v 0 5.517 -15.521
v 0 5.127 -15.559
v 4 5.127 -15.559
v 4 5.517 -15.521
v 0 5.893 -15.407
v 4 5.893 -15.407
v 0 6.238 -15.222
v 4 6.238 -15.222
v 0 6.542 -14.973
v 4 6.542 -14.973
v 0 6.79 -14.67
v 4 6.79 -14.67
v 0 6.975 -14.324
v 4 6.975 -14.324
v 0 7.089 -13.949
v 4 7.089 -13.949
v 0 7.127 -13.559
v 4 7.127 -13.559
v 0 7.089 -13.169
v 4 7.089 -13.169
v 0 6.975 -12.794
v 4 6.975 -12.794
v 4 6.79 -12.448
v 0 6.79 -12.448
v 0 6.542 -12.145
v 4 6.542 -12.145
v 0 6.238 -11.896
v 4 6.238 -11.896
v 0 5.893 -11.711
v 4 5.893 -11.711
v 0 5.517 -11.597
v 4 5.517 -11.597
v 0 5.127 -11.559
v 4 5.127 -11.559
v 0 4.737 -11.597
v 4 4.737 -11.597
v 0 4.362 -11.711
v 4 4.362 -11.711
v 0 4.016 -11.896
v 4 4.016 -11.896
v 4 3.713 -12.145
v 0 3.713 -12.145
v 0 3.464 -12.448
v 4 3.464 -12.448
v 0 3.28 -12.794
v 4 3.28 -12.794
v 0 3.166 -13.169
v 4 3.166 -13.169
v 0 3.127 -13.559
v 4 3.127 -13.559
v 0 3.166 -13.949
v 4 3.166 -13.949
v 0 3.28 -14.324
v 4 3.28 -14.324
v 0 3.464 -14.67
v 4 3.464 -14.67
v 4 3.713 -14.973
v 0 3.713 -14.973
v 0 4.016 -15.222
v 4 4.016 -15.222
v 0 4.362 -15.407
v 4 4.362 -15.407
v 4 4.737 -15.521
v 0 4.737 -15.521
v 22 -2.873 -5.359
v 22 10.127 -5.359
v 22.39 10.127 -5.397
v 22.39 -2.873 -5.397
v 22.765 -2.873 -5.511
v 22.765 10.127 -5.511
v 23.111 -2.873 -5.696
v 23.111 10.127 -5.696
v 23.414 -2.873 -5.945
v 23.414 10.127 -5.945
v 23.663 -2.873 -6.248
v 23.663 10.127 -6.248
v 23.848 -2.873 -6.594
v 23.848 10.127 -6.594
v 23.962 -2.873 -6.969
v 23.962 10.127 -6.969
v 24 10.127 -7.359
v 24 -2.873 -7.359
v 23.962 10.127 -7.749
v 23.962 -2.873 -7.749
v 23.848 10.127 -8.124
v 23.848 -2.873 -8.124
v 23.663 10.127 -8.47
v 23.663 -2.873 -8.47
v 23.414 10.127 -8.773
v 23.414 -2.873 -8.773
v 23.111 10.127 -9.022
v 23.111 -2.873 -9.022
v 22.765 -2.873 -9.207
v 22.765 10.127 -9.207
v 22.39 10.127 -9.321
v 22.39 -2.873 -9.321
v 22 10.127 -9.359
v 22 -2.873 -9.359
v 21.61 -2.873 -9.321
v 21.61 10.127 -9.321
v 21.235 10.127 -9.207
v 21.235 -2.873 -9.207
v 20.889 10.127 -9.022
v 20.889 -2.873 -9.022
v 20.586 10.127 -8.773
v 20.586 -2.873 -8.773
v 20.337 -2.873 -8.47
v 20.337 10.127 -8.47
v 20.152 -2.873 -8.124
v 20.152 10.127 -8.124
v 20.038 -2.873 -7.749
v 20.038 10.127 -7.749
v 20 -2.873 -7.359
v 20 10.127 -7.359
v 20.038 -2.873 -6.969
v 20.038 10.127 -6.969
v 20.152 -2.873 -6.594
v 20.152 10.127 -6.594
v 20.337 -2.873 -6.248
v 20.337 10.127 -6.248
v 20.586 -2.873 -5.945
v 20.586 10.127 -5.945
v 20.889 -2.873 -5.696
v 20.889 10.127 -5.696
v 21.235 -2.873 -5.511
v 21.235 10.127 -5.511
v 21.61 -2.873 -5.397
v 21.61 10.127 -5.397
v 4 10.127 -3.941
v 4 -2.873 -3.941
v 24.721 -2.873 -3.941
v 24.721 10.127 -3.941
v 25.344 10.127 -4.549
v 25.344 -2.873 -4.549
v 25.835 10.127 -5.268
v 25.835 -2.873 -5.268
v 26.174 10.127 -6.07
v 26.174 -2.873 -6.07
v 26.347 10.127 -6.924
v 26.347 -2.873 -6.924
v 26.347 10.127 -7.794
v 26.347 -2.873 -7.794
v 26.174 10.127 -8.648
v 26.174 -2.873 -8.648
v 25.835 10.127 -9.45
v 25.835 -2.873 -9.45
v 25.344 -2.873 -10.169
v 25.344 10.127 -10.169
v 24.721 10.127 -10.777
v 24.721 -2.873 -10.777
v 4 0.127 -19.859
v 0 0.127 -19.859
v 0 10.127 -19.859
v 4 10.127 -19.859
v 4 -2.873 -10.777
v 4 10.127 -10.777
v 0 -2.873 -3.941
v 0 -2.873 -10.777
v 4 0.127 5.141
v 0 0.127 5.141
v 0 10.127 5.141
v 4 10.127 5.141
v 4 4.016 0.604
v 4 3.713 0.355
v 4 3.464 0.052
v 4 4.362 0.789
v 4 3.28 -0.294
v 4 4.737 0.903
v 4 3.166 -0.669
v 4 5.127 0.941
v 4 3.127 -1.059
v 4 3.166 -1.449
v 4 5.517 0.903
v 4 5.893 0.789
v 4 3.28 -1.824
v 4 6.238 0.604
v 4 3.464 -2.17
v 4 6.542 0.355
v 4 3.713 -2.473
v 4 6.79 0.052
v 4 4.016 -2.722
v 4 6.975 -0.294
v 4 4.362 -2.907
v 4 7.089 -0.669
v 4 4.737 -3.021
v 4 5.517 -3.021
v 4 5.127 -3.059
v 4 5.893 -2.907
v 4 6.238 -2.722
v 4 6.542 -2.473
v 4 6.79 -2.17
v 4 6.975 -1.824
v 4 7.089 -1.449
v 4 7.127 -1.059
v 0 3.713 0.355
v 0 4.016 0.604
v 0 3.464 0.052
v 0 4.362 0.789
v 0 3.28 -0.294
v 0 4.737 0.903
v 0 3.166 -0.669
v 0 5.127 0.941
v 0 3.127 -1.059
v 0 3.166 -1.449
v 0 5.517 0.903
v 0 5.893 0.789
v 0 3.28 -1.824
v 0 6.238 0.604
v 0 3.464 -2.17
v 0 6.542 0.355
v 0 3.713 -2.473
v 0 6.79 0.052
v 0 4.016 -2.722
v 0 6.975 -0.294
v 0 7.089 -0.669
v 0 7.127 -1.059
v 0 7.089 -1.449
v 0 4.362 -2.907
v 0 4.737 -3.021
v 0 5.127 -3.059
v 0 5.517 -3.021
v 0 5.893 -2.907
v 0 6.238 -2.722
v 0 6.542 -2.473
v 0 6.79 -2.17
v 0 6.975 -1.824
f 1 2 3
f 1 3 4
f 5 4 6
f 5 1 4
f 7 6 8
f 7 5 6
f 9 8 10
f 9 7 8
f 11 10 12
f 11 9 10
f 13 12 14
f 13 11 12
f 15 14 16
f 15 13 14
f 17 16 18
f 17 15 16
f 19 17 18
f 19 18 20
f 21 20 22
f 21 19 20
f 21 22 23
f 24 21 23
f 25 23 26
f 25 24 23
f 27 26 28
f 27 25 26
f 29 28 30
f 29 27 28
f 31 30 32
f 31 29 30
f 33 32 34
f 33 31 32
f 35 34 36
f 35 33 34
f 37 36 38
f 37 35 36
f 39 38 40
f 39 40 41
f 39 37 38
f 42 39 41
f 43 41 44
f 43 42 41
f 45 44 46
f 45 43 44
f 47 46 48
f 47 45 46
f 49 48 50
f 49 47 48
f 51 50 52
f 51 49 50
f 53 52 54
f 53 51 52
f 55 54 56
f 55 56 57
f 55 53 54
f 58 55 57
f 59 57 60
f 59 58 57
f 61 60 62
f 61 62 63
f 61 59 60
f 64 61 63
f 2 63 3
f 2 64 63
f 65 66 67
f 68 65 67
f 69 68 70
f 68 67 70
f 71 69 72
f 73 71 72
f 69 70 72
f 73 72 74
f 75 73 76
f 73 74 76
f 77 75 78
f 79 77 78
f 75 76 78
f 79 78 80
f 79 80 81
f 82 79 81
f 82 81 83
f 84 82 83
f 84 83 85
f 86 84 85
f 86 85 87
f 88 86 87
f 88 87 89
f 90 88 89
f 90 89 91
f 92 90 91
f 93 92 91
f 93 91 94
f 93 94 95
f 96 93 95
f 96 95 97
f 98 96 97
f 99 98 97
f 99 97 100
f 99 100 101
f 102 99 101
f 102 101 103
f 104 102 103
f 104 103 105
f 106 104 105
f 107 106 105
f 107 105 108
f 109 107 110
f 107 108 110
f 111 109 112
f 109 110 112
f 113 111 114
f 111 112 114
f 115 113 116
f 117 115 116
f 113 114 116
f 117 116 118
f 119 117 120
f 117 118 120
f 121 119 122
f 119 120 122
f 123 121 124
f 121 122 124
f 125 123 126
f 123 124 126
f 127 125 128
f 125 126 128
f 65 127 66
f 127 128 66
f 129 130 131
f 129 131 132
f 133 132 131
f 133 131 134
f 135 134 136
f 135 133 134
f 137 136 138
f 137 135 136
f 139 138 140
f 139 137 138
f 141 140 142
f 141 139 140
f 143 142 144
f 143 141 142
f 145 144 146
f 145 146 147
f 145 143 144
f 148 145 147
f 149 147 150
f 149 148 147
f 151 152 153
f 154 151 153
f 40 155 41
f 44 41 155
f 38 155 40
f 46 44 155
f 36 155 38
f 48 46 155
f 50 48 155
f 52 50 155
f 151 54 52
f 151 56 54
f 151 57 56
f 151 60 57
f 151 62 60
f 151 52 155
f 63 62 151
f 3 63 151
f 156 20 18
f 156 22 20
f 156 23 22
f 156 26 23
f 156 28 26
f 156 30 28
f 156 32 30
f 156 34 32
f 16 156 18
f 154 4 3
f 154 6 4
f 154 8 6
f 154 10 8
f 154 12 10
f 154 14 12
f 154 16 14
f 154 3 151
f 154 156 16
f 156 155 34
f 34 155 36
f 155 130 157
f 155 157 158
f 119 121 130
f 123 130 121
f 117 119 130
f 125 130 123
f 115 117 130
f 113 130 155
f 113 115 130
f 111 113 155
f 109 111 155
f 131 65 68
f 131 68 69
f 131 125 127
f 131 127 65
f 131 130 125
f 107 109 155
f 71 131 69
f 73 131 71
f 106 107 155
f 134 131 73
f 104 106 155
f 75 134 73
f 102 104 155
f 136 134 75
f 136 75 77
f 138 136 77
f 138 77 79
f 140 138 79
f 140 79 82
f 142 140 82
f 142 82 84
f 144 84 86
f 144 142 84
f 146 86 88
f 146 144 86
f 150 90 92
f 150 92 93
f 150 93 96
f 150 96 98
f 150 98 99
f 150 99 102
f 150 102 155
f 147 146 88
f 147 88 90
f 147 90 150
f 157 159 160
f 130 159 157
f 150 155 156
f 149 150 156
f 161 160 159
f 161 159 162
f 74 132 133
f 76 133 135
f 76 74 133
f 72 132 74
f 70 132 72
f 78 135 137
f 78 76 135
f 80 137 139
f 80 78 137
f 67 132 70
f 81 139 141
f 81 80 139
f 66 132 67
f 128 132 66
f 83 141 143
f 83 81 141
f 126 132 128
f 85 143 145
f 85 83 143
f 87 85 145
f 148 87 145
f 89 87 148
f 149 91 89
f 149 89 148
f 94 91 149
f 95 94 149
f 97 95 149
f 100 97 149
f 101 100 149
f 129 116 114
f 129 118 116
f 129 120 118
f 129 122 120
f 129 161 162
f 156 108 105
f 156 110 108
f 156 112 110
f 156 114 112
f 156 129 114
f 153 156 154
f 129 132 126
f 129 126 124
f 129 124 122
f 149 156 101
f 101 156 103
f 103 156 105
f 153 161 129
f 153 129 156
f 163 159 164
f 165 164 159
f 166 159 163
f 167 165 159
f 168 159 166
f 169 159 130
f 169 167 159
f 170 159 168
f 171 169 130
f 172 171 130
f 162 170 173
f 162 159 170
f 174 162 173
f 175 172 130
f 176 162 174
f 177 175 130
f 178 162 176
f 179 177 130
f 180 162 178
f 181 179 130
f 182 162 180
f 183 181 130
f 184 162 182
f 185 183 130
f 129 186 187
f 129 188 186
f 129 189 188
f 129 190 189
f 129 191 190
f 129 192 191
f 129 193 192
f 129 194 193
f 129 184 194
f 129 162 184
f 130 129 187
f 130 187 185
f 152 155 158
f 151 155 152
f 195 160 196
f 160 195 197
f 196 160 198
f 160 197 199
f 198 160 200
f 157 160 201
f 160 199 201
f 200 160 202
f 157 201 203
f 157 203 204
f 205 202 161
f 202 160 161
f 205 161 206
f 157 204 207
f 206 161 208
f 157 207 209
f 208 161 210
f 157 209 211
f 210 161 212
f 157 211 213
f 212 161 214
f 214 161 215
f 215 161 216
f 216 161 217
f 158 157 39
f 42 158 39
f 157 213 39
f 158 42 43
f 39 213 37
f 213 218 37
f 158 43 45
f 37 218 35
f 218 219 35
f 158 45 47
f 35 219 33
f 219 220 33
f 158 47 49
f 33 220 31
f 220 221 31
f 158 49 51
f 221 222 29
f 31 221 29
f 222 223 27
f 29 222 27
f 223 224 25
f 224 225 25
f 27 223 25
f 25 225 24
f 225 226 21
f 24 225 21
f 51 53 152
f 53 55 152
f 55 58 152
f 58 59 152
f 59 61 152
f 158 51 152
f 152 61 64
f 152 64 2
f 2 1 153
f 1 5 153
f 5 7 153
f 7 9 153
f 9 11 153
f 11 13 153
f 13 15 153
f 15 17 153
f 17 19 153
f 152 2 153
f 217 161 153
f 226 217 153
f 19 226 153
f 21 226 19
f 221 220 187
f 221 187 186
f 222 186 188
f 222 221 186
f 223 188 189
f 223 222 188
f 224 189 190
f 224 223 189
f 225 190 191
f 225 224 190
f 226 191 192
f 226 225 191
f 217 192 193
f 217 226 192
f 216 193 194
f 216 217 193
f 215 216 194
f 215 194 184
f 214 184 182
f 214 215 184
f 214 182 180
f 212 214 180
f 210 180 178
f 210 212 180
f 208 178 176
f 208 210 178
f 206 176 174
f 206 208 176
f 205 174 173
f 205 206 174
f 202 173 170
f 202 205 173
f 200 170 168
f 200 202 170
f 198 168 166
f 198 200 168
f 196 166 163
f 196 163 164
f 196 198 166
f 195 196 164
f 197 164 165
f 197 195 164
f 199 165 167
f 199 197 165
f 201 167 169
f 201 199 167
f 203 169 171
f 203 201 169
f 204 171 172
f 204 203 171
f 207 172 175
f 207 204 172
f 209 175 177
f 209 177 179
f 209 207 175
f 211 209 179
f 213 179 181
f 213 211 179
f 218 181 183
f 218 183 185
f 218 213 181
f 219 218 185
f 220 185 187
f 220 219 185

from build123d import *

# Parameters (mm, degrees)
CROQUIS1_W              = 25
CROQUIS1_H              = 10
CROQUIS1_R              = 2
SALIENTE_EXTRUIR1_DEPTH = 4
CROQUIS2_W              = 6.835109388
CROQUIS2_H              = 13
SALIENTE_EXTRUIR2_DEPTH = 24
CROQUIS3_R              = 2
CORTAR_EXTRUIR1_DEPTH   = 24
SALIENTE_EXTRUIR3_DEPTH = 4
CORTAR_EXTRUIR2_DEPTH   = 24


with BuildPart() as part:
    # Croquis1 → Saliente-Extruir1 (new body)
    with BuildSketch(Plane(origin=(0, 0, 0), x_dir=(0, 0, -1), z_dir=(1, 0, 0))):
        with Locations((7.35898106, 5.127314815)):
            Rectangle(CROQUIS1_W, CROQUIS1_H)
        with Locations((1.05898106, 5.127314815)):
            Circle(CROQUIS1_R, mode=Mode.SUBTRACT)
        with Locations((13.55898106, 5.127314815)):
            Circle(CROQUIS1_R, mode=Mode.SUBTRACT)
    extrude(amount=SALIENTE_EXTRUIR1_DEPTH)

    # Croquis2 → Saliente-Extruir2 (add)
    with BuildSketch(Plane(origin=(4, 0, 0), x_dir=(0, 0, -1), z_dir=(1, 0, 0))):
        with Locations((7.35898106, 3.627314815)):
            Rectangle(CROQUIS2_W, CROQUIS2_H)
    extrude(amount=SALIENTE_EXTRUIR2_DEPTH)

    # Croquis3 → Cortar-Extruir1 (cut)
    with BuildSketch(Plane(origin=(0, 10.127314815, 0), x_dir=(1, 0, 0), z_dir=(0, 1, 0))):
        with Locations(Location((22, 7.35898106, 0), (0, 0, 270))):
            Circle(CROQUIS3_R)
    extrude(amount=-CORTAR_EXTRUIR1_DEPTH, mode=Mode.SUBTRACT)

    # Croquis4 → Saliente-Extruir3 (add, through all)
    with BuildSketch(Plane(origin=(4, 0, 0), x_dir=(0, 0, -1), z_dir=(1, 0, 0))):
        Polygon((-5.14101894, 0.127314815), (3.941426366, -2.872685185), (10.776535754, -2.872685185), (19.85898106, 0.127314815), align=None)
    extrude(amount=-SALIENTE_EXTRUIR3_DEPTH)

    # Croquis5 → Cortar-Extruir2 (cut)
    with BuildSketch(Plane(origin=(0, 10.127314815, 0), x_dir=(1, 0, 0), z_dir=(0, 1, 0))):
        with BuildLine():
            Line((28, 3.941426366), (24.720702874, 3.941426366))
            ThreePointArc((24.720702874, 3.941426366), (26.368283898, 7.35898106), (24.720702874, 10.776535754))
            Line((24.720702874, 10.776535754), (28, 10.776535754))
            Line((28, 10.776535754), (28, 3.941426366))
        make_face()
    extrude(amount=-CORTAR_EXTRUIR2_DEPTH, mode=Mode.SUBTRACT)


solid = part.part
